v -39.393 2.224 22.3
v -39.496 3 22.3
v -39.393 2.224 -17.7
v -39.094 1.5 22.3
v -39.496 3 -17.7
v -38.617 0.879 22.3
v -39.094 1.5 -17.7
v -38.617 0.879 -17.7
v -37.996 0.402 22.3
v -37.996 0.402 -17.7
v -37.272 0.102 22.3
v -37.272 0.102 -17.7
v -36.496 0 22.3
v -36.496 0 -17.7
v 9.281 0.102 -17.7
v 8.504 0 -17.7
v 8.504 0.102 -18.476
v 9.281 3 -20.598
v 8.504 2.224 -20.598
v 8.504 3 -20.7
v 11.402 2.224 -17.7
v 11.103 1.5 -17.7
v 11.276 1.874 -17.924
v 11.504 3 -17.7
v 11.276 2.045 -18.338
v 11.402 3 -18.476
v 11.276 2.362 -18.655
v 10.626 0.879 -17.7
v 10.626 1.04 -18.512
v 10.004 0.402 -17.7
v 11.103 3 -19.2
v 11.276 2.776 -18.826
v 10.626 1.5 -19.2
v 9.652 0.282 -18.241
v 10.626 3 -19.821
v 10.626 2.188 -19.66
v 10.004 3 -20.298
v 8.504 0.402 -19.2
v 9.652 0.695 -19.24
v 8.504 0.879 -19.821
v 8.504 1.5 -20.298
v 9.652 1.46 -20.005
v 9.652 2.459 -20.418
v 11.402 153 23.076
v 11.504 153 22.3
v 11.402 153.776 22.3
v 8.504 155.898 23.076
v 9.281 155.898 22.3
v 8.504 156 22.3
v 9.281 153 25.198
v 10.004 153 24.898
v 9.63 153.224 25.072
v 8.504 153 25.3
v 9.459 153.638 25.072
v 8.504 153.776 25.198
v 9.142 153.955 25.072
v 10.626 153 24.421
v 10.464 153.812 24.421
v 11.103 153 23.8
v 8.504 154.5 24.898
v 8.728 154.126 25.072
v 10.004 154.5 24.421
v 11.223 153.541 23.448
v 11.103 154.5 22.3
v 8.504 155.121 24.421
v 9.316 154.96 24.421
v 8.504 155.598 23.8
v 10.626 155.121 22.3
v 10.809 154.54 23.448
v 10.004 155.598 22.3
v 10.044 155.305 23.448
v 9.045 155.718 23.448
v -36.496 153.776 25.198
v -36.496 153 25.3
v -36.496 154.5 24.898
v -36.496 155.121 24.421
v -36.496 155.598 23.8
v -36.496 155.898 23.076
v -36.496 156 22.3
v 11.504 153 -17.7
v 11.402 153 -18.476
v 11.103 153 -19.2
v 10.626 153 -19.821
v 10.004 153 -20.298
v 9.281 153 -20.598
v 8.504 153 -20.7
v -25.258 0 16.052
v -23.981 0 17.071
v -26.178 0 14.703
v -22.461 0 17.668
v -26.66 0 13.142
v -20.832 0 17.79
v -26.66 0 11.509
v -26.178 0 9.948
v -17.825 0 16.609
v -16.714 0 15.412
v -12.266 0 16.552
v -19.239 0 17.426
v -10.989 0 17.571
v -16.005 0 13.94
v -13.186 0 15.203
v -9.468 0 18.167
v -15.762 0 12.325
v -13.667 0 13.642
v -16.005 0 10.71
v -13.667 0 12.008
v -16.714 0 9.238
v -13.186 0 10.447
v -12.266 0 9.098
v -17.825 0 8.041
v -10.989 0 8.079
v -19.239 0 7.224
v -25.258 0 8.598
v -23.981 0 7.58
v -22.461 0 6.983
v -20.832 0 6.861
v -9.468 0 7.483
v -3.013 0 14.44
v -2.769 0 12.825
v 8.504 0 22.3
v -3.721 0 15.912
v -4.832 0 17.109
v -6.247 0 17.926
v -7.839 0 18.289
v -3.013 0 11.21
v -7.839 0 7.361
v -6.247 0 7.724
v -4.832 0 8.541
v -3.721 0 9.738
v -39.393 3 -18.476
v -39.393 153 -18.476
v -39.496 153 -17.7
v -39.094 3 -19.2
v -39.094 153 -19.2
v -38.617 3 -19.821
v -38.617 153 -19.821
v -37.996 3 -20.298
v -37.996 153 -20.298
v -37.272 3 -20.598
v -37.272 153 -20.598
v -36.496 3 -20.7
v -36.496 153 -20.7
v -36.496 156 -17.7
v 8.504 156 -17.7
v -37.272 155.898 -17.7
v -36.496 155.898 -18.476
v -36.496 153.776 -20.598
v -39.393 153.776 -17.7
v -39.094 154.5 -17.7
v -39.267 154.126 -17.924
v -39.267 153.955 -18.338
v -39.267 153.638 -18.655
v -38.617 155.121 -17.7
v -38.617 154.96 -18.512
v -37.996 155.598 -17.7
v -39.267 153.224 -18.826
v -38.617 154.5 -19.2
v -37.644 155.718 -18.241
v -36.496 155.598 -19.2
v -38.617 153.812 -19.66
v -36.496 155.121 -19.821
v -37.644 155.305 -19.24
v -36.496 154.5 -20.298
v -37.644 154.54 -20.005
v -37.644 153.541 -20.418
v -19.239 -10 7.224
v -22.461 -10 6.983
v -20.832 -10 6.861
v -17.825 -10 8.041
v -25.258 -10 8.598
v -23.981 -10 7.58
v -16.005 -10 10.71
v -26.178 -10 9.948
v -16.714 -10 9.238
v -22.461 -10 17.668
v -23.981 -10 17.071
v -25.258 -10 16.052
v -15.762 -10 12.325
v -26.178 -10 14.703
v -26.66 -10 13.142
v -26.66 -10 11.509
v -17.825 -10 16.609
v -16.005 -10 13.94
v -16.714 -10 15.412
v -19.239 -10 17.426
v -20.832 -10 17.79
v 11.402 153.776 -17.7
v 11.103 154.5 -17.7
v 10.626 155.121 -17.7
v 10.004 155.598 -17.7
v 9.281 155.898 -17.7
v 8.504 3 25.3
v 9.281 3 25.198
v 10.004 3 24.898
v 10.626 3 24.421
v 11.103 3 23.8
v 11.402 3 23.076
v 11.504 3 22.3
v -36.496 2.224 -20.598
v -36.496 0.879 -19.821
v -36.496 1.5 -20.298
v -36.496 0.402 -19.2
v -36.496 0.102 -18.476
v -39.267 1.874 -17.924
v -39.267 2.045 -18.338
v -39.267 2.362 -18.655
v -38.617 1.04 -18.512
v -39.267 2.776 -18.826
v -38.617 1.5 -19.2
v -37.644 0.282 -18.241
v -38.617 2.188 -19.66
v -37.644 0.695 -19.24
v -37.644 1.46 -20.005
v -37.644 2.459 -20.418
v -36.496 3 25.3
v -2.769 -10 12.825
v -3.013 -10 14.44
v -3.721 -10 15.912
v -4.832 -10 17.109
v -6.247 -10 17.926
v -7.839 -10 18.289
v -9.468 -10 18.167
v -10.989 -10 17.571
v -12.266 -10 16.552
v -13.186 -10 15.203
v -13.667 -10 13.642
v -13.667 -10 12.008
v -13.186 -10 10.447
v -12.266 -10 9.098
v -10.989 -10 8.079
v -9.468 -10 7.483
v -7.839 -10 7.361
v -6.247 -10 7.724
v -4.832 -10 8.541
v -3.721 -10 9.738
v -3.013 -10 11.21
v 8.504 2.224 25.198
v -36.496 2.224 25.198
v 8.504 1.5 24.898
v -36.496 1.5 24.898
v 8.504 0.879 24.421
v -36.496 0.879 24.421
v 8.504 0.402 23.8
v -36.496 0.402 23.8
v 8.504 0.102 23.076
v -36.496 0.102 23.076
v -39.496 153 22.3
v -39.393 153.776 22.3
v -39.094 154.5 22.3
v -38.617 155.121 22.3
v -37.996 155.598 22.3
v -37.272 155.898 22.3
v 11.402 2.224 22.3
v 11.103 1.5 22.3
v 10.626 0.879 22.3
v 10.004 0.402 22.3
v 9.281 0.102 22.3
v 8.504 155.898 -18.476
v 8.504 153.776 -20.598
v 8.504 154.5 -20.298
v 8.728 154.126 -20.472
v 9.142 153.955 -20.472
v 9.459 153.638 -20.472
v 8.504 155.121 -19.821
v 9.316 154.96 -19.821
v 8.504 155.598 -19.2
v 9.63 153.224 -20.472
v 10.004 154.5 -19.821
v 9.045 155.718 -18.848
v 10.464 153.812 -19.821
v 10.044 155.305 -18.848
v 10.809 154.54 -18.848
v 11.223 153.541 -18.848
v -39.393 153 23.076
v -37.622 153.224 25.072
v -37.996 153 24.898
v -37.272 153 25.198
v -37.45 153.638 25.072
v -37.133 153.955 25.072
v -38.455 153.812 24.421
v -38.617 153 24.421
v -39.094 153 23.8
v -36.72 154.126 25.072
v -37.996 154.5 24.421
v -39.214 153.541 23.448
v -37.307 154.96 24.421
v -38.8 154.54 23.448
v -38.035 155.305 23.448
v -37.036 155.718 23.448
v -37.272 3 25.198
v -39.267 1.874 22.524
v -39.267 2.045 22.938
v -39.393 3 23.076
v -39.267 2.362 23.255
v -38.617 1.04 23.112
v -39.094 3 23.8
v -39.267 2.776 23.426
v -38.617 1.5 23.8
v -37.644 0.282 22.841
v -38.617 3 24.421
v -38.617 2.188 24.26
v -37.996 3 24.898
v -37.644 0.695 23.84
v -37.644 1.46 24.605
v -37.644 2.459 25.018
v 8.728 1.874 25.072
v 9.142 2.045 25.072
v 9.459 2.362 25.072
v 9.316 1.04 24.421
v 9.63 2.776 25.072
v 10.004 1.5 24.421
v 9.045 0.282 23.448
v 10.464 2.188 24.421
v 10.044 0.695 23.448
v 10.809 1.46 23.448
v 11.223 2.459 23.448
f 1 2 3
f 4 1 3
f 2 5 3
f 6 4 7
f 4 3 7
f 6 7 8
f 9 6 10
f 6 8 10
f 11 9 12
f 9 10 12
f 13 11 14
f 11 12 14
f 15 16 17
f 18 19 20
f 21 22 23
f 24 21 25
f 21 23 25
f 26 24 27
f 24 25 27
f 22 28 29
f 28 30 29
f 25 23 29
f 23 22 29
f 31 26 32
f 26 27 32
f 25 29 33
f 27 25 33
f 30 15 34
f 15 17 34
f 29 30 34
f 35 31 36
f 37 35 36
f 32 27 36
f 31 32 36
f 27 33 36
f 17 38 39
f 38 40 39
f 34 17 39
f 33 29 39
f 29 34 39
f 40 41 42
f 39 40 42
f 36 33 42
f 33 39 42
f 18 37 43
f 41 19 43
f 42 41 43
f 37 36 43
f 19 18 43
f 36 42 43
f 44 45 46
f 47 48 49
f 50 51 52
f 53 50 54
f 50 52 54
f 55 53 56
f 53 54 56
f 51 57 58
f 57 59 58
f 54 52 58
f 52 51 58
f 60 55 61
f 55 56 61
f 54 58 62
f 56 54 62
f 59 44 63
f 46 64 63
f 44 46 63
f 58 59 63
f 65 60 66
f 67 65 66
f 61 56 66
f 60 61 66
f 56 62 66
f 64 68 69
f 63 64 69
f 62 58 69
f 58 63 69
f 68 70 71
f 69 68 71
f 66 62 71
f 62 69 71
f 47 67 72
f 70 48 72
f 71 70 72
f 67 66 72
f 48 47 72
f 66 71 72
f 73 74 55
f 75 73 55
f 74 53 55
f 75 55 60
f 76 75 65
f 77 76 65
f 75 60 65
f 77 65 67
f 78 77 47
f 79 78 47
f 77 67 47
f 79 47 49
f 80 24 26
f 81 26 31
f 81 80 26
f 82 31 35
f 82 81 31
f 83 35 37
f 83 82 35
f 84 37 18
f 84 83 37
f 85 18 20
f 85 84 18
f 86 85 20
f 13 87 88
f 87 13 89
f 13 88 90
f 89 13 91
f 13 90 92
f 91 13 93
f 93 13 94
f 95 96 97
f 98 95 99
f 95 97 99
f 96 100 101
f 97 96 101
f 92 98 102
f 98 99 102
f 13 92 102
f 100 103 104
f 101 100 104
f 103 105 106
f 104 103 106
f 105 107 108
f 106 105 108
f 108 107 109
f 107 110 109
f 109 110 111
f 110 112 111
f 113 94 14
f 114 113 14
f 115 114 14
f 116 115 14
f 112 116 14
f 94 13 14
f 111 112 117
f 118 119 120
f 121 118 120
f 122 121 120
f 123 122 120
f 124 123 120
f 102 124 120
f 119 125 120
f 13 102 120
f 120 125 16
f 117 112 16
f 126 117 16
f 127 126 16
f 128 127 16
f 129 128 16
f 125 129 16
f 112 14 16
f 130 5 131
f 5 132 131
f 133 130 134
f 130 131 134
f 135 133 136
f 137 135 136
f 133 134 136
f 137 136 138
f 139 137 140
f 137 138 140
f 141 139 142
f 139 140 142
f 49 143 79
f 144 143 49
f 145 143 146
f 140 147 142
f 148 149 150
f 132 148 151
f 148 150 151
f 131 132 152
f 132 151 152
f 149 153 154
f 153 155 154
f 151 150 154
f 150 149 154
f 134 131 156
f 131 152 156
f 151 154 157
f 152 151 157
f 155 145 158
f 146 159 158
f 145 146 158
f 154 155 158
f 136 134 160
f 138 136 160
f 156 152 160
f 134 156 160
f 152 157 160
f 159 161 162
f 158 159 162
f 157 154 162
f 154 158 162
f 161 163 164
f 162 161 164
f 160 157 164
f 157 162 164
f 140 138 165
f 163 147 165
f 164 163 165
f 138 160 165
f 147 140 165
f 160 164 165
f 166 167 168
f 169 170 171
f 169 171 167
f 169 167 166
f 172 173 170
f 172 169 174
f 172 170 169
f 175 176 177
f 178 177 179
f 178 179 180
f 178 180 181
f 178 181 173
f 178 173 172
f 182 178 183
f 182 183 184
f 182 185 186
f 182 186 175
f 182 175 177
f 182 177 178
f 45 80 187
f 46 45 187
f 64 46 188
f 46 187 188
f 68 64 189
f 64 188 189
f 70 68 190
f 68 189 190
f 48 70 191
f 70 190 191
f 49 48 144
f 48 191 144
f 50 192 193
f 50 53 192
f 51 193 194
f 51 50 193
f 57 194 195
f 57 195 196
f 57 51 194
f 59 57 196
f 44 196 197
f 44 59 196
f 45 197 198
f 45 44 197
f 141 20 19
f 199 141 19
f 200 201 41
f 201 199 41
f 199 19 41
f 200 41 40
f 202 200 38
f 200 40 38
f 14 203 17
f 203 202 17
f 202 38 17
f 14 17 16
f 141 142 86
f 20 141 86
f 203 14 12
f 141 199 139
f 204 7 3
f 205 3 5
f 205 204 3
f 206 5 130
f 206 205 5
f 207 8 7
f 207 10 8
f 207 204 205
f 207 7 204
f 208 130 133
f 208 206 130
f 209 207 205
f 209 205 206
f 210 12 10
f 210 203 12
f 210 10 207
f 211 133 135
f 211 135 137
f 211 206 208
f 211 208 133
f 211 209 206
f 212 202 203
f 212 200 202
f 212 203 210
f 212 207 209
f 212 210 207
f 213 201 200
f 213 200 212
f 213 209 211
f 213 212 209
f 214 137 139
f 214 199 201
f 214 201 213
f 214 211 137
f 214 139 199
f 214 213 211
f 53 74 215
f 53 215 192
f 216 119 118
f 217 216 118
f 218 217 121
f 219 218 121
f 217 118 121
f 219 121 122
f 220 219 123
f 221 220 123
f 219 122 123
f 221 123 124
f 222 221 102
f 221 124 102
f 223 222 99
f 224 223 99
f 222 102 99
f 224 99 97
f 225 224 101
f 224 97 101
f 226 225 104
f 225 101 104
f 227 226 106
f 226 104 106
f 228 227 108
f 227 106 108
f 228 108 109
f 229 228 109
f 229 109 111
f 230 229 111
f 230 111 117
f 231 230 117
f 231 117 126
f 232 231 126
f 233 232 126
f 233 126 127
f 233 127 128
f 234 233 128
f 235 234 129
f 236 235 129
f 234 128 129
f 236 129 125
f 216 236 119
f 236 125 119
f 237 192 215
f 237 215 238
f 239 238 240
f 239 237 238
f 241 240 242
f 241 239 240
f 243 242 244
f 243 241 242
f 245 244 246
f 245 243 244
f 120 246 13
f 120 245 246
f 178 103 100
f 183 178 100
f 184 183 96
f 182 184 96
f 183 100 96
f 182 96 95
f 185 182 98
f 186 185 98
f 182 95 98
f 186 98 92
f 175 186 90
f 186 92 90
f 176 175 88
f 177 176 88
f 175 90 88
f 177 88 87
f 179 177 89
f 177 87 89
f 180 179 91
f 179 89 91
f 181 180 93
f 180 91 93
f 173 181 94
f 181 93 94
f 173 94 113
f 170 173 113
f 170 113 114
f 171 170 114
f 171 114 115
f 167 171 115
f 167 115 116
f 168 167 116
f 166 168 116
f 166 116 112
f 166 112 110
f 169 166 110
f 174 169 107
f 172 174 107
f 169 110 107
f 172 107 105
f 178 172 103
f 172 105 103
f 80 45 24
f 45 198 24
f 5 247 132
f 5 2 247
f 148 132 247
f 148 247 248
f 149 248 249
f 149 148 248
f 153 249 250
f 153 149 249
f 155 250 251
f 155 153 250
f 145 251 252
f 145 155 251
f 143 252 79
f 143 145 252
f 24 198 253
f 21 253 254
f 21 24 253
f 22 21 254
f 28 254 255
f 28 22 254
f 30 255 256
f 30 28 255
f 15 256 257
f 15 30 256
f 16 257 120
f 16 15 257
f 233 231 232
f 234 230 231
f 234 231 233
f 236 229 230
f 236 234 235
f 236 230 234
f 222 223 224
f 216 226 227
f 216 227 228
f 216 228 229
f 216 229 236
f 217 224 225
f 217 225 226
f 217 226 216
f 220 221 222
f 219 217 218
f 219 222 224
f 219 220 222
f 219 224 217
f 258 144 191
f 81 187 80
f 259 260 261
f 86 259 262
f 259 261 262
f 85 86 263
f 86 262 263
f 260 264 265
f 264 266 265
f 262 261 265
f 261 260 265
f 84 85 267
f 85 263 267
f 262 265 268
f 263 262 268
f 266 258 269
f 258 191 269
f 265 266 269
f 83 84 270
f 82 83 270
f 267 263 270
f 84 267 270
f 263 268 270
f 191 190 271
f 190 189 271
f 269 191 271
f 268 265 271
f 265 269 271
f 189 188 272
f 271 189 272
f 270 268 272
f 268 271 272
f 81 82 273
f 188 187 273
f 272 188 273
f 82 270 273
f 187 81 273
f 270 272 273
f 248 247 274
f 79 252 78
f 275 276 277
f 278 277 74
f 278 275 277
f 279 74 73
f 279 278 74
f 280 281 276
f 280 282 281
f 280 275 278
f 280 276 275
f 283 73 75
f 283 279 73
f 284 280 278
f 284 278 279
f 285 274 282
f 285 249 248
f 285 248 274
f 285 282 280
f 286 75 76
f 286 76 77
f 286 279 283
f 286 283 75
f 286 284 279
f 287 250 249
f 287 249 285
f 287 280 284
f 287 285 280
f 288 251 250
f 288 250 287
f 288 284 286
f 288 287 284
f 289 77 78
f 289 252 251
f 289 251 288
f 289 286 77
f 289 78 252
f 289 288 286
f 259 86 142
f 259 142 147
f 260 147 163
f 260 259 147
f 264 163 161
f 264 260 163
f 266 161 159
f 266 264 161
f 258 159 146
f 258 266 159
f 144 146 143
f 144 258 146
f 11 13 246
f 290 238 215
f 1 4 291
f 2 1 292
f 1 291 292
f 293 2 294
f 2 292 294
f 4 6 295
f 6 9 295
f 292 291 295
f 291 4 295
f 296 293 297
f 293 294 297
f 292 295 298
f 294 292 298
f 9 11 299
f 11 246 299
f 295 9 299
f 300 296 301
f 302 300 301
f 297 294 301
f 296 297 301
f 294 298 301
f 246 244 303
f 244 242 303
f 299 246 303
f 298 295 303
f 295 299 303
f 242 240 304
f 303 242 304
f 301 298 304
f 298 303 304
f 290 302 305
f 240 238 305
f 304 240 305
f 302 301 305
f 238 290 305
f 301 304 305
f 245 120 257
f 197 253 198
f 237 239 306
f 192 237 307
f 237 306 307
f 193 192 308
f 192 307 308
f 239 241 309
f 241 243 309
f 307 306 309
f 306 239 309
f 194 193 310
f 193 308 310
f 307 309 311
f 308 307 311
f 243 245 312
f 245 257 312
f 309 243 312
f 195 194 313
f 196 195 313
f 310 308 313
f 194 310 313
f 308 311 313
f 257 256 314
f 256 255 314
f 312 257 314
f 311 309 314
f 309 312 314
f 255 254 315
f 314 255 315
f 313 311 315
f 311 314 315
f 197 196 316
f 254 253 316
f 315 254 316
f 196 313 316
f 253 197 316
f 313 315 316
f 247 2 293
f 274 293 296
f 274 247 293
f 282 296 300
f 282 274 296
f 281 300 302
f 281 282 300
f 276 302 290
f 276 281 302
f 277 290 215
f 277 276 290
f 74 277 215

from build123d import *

# Parameters (mm, degrees)
SKETCH1_W           = 51
SKETCH1_H           = 46
BOSS_EXTRUDE1_DEPTH = 156
FILLET1_R           = 3
SKETCH2_R           = 5.479665814
BOSS_EXTRUDE2_DEPTH = 10


with BuildPart() as part:
    # Sketch1 → Boss-Extrude1 (new body)
    with BuildSketch(Plane(origin=(0, 0, 0), x_dir=(1, 0, 0), z_dir=(0, 1, 0))):
        with Locations((-13.995554746, -2.3)):
            Rectangle(SKETCH1_W, SKETCH1_H)
    extrude(amount=BOSS_EXTRUDE1_DEPTH)

    # Fillet1
    fillet1_edges = [part.edges().sort_by_distance(p)[0] for p in [
        (11.504445254, 156, 2.3),
        (-13.995554746, 156, -20.7),
        (-39.495554746, 156, 2.3),
        (-13.995554746, 0, -20.7),
        (11.504445254, 0, 2.3),
        (-13.995554746, 0, 25.3),
        (-39.495554746, 0, 2.3),
        (-39.495554746, 78, -20.7),
        (11.504445254, 78, -20.7),
        (11.504445254, 78, 25.3),
        (-39.495554746, 78, 25.3),
        (-13.995554746, 156, 25.3),
    ]]
    fillet(fillet1_edges, radius=FILLET1_R)

    # Sketch2 → Boss-Extrude2 (add)
    with BuildSketch(Plane.XZ):
        with Locations((-21.241241136, 12.3252816)):
            Circle(SKETCH2_R)
        with Locations((-8.248975885, 12.82498411)):
            Circle(SKETCH2_R)
    extrude(amount=BOSS_EXTRUDE2_DEPTH)


solid = part.part
